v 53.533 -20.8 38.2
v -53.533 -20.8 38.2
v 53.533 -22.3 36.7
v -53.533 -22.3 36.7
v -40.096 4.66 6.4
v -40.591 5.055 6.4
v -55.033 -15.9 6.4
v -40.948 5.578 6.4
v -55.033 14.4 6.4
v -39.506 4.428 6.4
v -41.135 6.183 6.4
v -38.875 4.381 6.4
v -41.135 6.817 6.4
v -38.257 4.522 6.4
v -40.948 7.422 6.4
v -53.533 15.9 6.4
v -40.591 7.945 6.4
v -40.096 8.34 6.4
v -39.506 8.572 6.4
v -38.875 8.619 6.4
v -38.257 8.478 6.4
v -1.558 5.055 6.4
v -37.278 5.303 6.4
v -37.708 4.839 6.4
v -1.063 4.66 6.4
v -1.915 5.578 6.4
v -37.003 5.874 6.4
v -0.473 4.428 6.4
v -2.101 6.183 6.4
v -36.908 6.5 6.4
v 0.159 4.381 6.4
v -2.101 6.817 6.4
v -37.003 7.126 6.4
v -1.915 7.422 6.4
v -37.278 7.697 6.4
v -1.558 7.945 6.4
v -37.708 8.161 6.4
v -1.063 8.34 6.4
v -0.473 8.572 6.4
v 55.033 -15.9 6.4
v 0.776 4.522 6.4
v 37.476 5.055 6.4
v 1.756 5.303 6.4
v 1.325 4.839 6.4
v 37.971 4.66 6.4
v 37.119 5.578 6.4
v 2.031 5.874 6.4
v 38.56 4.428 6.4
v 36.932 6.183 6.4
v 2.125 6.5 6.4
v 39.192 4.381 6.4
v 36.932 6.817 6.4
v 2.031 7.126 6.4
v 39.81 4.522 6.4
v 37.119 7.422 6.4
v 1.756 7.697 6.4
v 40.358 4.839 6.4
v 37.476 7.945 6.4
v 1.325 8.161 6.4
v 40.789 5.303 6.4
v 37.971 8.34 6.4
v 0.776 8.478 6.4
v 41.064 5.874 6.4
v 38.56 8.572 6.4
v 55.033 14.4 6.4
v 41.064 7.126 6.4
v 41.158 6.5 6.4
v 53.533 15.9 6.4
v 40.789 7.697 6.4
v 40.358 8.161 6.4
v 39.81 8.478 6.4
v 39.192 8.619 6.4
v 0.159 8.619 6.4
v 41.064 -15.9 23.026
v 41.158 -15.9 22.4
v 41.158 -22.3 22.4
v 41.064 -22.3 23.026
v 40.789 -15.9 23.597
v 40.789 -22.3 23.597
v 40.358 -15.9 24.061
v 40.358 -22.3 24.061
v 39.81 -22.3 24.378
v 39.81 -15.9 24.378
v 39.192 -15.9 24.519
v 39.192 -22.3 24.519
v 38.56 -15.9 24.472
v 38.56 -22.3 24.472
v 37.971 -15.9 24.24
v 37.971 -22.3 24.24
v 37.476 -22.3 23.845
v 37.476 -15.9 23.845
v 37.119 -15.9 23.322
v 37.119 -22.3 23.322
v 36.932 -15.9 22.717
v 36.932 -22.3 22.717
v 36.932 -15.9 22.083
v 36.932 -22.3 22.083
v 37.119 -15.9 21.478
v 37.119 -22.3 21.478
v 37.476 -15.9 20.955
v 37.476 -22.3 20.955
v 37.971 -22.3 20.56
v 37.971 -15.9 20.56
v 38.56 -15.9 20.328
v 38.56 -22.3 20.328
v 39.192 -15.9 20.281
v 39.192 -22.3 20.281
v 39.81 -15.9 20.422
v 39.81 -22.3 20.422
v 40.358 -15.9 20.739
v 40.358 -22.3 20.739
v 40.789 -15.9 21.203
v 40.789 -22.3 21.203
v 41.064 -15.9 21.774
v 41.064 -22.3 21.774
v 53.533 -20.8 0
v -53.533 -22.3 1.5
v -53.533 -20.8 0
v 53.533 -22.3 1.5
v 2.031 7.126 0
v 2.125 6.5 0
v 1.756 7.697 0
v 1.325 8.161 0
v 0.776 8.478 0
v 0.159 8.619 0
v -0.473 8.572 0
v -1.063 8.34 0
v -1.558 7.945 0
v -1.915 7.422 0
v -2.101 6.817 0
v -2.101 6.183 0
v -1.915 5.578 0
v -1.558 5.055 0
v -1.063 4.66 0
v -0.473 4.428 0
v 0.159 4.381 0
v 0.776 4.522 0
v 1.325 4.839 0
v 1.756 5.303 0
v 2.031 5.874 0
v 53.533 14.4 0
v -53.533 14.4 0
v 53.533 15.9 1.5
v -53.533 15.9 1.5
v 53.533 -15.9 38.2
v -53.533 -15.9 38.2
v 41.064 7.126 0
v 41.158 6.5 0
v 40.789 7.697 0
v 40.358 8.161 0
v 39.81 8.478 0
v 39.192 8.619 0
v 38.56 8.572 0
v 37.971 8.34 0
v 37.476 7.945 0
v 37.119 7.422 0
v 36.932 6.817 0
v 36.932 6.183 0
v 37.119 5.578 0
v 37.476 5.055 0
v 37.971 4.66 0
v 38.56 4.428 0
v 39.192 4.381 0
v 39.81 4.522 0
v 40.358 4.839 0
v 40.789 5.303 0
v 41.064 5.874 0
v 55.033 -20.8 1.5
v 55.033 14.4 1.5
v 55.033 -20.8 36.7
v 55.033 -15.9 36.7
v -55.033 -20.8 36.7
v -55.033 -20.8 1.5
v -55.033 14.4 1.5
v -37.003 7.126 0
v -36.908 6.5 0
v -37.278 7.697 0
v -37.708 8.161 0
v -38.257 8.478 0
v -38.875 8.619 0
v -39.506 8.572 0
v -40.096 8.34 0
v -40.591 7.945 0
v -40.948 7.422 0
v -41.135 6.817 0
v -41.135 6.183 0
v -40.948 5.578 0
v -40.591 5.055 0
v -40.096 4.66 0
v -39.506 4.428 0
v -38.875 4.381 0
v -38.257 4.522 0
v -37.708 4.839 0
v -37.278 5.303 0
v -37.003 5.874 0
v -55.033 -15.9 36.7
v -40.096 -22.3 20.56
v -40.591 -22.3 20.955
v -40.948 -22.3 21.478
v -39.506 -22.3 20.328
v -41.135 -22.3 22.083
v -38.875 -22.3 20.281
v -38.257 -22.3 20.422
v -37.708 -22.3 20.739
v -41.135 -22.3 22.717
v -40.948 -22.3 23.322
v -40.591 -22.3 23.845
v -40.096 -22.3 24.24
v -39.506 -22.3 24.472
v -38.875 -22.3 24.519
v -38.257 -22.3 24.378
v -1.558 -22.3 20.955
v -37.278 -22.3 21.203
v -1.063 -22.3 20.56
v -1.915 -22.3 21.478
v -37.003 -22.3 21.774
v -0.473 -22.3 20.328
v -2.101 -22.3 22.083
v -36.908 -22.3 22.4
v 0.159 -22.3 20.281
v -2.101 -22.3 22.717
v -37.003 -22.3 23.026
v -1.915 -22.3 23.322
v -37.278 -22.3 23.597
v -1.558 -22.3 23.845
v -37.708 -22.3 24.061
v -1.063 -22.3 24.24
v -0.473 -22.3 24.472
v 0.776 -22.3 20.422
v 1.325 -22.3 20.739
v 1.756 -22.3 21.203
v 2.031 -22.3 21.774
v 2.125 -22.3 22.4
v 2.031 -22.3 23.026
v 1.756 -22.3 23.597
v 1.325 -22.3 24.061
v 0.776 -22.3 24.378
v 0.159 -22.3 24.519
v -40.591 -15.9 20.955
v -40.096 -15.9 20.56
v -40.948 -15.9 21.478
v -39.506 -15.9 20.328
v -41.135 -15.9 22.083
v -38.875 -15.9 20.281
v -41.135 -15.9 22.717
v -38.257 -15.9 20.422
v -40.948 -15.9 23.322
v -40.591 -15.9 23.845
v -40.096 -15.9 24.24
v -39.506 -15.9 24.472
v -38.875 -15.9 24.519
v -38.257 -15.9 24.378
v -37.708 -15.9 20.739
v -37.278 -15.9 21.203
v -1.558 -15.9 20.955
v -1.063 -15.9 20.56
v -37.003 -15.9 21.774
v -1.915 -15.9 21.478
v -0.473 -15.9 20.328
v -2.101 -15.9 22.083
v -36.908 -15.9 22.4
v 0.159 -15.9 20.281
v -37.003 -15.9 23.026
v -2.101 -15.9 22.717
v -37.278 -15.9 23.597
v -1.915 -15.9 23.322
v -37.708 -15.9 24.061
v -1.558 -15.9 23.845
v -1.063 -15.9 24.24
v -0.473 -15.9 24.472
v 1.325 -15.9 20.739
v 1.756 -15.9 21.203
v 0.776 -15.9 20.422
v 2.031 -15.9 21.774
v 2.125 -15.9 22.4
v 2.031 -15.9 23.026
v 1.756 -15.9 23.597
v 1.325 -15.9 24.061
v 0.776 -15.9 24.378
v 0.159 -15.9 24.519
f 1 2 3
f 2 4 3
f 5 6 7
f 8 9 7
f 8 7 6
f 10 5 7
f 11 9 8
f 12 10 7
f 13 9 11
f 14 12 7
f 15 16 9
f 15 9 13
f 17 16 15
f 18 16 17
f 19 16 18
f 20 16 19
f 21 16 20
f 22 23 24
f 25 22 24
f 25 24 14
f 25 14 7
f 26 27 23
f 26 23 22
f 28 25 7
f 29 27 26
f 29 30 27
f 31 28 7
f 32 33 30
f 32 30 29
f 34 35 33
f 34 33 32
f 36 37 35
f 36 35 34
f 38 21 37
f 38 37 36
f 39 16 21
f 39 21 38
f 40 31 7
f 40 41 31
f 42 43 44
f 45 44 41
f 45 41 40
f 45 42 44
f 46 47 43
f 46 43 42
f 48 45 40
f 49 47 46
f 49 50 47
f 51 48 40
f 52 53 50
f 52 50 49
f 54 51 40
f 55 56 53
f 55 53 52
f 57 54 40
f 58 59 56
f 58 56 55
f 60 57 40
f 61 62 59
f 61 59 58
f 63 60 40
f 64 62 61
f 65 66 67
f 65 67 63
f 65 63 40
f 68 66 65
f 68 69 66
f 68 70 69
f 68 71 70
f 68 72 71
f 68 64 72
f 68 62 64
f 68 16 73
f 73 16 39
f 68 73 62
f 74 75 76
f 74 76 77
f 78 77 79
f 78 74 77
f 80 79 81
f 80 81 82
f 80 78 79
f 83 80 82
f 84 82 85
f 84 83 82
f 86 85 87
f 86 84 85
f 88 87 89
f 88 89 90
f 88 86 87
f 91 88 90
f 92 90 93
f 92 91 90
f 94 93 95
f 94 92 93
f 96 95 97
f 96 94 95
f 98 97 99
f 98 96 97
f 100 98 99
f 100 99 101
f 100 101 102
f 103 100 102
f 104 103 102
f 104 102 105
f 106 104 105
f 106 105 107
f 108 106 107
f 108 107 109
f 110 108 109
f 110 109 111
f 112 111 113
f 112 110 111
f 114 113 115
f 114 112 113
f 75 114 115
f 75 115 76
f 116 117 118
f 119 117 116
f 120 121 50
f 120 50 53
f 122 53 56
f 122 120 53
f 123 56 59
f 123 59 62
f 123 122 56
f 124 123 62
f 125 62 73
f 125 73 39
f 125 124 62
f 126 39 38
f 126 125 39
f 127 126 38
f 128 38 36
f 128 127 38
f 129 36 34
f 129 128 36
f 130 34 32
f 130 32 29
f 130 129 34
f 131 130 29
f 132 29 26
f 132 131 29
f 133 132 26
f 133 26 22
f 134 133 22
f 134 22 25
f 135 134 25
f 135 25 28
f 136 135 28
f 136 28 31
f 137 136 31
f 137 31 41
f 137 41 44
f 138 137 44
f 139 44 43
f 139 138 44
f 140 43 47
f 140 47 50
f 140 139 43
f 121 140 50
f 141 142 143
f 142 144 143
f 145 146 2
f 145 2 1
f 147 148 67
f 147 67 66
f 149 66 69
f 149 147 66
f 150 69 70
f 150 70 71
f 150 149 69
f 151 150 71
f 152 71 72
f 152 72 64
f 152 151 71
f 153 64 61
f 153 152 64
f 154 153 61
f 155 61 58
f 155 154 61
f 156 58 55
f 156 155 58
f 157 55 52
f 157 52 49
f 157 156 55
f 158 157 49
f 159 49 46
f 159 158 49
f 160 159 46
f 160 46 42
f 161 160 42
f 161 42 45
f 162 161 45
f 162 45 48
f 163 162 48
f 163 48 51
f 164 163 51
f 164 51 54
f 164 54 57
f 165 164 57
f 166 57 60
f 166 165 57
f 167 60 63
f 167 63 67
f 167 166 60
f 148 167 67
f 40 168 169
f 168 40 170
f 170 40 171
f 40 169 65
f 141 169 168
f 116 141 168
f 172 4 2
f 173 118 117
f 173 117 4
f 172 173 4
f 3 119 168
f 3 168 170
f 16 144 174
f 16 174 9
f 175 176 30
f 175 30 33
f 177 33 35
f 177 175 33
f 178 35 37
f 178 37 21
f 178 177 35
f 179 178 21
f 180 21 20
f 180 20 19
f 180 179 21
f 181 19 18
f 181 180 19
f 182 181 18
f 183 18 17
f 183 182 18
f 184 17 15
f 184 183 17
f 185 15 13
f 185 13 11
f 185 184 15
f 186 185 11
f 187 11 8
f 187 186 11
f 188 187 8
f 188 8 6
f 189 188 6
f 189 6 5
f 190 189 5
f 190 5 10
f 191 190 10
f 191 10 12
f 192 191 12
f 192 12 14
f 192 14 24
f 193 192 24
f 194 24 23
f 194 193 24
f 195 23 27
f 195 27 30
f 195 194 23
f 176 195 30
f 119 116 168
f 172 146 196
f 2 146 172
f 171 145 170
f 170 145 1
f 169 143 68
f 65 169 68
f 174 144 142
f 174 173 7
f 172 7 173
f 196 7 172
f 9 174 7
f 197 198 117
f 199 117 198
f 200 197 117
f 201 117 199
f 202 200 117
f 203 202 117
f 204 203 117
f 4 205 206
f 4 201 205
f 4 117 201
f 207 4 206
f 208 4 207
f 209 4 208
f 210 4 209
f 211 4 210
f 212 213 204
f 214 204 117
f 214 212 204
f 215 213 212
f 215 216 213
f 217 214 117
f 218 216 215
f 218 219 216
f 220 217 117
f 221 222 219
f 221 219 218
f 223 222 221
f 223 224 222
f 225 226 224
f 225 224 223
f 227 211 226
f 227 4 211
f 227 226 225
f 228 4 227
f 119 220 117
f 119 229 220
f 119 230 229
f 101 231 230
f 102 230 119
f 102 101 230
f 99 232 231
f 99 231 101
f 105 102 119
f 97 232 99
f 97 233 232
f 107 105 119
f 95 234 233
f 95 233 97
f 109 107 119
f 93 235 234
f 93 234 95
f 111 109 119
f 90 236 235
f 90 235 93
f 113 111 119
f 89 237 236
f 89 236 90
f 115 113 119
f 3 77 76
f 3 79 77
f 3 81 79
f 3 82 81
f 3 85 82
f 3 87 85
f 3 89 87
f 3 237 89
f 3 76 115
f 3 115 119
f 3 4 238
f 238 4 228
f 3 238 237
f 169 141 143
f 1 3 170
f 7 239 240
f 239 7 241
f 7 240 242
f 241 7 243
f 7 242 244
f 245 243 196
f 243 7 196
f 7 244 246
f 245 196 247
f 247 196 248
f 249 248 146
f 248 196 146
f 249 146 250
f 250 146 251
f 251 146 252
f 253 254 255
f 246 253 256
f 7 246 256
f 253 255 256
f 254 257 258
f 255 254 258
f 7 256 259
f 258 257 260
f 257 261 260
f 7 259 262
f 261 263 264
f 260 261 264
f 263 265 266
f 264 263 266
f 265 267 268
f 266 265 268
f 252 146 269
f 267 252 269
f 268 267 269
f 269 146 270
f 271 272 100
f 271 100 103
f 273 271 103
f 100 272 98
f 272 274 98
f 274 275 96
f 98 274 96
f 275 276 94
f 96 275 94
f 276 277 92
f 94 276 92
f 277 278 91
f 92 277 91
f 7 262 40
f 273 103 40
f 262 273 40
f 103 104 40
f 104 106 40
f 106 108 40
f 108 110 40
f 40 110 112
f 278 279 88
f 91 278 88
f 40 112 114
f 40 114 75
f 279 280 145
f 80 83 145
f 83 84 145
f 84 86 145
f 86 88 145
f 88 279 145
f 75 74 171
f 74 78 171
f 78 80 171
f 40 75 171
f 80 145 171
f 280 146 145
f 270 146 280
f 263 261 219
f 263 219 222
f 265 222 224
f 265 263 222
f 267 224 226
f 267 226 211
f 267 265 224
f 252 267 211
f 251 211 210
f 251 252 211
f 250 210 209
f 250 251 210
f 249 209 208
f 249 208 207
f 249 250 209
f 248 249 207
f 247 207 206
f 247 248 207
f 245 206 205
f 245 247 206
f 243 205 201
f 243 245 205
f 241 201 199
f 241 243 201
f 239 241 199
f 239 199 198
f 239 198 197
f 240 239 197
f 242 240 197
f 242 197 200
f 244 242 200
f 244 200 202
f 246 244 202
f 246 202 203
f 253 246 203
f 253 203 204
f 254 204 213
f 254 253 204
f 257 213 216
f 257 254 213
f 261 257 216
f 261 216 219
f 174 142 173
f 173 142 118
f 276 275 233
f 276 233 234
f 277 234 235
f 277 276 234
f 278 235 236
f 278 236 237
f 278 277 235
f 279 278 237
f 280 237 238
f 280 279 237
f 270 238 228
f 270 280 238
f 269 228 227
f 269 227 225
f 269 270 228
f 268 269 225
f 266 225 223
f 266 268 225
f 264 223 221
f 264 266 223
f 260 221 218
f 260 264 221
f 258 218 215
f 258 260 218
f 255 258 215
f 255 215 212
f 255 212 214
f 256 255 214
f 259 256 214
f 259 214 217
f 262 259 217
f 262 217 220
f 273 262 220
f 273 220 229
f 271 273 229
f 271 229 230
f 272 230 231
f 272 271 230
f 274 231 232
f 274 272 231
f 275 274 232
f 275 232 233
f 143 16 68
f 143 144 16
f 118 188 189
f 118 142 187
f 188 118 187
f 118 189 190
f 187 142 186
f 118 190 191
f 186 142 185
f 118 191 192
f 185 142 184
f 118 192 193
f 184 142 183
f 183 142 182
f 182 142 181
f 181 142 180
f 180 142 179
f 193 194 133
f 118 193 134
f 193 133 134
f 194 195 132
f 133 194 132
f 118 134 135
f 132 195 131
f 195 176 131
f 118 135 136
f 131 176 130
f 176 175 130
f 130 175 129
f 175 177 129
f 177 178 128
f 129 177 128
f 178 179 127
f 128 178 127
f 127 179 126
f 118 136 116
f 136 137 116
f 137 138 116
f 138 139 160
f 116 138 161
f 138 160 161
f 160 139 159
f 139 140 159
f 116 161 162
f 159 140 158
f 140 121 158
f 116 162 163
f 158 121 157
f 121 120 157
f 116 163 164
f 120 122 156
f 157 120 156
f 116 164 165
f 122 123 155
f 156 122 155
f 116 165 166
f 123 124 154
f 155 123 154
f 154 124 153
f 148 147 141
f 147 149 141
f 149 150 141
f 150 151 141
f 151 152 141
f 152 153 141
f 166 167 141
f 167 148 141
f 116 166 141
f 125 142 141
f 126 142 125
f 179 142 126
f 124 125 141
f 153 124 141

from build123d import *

# Parameters (mm, degrees)
F0_W     = 110.066666
F0_H     = 31.8
F0_R     = 2.125
F1_DEPTH = 6.4
F2_W     = 110.066666
F2_H     = 38.2
F2_R     = 2.125
F3_DEPTH = 6.4
F4_SIZE  = 1.5


with BuildPart() as f1:
    # F0 (on Top) → F1 (new body)
    with BuildSketch(Plane.XY):
        Rectangle(F0_W, F0_H)
        with Locations((-39.033333, 6.5)):
            Circle(F0_R, mode=Mode.SUBTRACT)
        with Locations((0, 6.5)):
            Circle(F0_R, mode=Mode.SUBTRACT)
        with Locations((39.033333, 6.5)):
            Circle(F0_R, mode=Mode.SUBTRACT)
    extrude(amount=F1_DEPTH)

    # F2 (on face) → F3 (join)
    with BuildSketch(Plane.XZ.offset(15.9)):
        with Locations((0, 19.1)):
            Rectangle(F2_W, F2_H)
        with Locations((-39.033333, 22.4)):
            Circle(F2_R, mode=Mode.SUBTRACT)
        with Locations((0, 22.4)):
            Circle(F2_R, mode=Mode.SUBTRACT)
        with Locations((39.033333, 22.4)):
            Circle(F2_R, mode=Mode.SUBTRACT)
    extrude(amount=F3_DEPTH)

    # F4
    f4_edges = [f1.edges().sort_by_distance(p)[0] for p in [
        (0, -22.3, 38.2),
        (0, -22.3, 0),
        (0, 15.9, 0),
        (55.033333, -3.2, 0),
        (55.033333, 15.9, 3.2),
        (-55.033333, 15.9, 3.2),
        (-55.033333, -3.2, 0),
        (-55.033333, -22.3, 19.1),
        (55.033333, -22.3, 19.1),
        (-55.033333, -19.1, 38.2),
        (55.033333, -19.1, 38.2),
    ]]
    chamfer(f4_edges, length=F4_SIZE)


solid = f1.part
